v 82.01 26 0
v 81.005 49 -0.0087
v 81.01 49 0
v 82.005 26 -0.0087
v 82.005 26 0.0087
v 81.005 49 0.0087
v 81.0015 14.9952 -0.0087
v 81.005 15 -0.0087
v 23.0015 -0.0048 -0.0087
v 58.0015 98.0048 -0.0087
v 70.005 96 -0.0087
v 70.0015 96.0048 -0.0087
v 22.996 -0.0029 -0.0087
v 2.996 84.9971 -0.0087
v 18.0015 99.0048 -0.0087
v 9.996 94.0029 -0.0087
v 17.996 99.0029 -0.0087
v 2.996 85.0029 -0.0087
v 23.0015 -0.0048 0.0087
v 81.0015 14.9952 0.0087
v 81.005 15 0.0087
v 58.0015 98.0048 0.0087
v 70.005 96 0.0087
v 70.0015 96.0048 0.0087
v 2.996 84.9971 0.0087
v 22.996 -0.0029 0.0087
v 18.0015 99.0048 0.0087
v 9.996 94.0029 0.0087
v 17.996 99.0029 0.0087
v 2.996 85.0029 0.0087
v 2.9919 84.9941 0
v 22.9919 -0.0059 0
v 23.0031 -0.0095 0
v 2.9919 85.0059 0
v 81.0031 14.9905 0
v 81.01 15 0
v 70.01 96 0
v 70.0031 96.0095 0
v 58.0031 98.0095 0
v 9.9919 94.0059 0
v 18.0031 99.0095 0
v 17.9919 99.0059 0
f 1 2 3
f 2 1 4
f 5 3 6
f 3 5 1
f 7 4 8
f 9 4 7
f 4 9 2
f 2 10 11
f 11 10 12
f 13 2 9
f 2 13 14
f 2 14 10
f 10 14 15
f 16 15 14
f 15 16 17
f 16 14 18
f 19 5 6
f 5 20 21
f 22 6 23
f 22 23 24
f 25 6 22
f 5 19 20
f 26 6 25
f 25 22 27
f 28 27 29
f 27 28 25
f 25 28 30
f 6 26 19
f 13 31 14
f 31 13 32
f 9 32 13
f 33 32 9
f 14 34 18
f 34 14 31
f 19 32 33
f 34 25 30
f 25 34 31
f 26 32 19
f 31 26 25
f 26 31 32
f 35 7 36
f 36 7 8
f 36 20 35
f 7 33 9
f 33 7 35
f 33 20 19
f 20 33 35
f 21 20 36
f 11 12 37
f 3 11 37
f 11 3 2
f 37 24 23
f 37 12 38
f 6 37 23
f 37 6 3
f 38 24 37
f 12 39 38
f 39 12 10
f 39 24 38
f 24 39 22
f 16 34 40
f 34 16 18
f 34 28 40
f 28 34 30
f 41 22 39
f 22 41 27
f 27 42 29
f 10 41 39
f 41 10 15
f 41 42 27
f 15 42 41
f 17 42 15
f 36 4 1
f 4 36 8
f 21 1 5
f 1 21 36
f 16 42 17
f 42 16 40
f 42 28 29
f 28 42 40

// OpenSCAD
color([0.3519350680925015,0.6477014615427978,0.14125726454845833]) hull(){
    translate([81,49]) sphere(0.01);
    translate([77,50]) sphere(0.01);
    translate([82,26]) sphere(0.01);
}
color([0.23013900541024712,0.8285218163248013,0.9603761550286747]) hull(){
    translate([23,0]) sphere(0.01);
    translate([18,24]) sphere(0.01);
    translate([3,85]) sphere(0.01);
}
color([0.6050710034948523,0.017553655236826726,0.43262871278032167]) hull(){
    translate([81,15]) sphere(0.01);
    translate([64,14]) sphere(0.01);
    translate([23,0]) sphere(0.01);
}
color([0.2571490251669072,0.4480229944680496,0.14517873337393172]) hull(){
    translate([64,14]) sphere(0.01);
    translate([42,29]) sphere(0.01);
    translate([23,0]) sphere(0.01);
}
color([0.8405131005933094,0.9776834869331054,0.10300019528175153]) hull(){
    translate([42,29]) sphere(0.01);
    translate([44,47]) sphere(0.01);
    translate([35,48]) sphere(0.01);
}
color([0.998153073210626,0.8535026464000083,0.6855970549077809]) hull(){
    translate([18,24]) sphere(0.01);
    translate([18,58]) sphere(0.01);
    translate([3,85]) sphere(0.01);
}
color([0.7995005100691247,0.34047238184459006,0.1286635278612125]) hull(){
    translate([80,52]) sphere(0.01);
    translate([81,49]) sphere(0.01);
    translate([70,96]) sphere(0.01);
}
color([0.6020598448119898,0.9167847797194366,0.02081986636819022]) hull(){
    translate([81,49]) sphere(0.01);
    translate([80,52]) sphere(0.01);
    translate([77,50]) sphere(0.01);
}
color([0.9135118305629362,0.3823609034395232,0.42581309278619206]) hull(){
    translate([26,22]) sphere(0.01);
    translate([42,29]) sphere(0.01);
    translate([35,48]) sphere(0.01);
}
color([0.08967296065919184,0.0016857337534631478,0.31287848776698257]) hull(){
    translate([42,29]) sphere(0.01);
    translate([26,22]) sphere(0.01);
    translate([23,0]) sphere(0.01);
}
color([0.09731792302828757,0.364404074066101,0.8754307508322564]) hull(){
    translate([68,15]) sphere(0.01);
    translate([64,14]) sphere(0.01);
    translate([81,15]) sphere(0.01);
}
color([0.6967090939923642,0.5776053806129825,0.18685318159950626]) hull(){
    translate([59,71]) sphere(0.01);
    translate([80,52]) sphere(0.01);
    translate([70,96]) sphere(0.01);
}
color([0.9585806736472646,0.593334846568766,0.09927504601217696]) hull(){
    translate([80,52]) sphere(0.01);
    translate([59,71]) sphere(0.01);
    translate([77,50]) sphere(0.01);
}
color([0.19313665173925,0.6863688301261038,0.2093263356404984]) hull(){
    translate([58,98]) sphere(0.01);
    translate([59,71]) sphere(0.01);
    translate([70,96]) sphere(0.01);
}
color([0.2694340379225941,0.24598969558588324,0.16092298384524362]) hull(){
    translate([59,71]) sphere(0.01);
    translate([58,98]) sphere(0.01);
    translate([50,93]) sphere(0.01);
}
color([0.5102606956149307,0.431705445139412,0.38909399282504675]) hull(){
    translate([6,84]) sphere(0.01);
    translate([10,94]) sphere(0.01);
    translate([3,85]) sphere(0.01);
}
color([0.3194819673674283,0.6655357355223767,0.22692357675811492]) hull(){
    translate([18,58]) sphere(0.01);
    translate([6,84]) sphere(0.01);
    translate([3,85]) sphere(0.01);
}
color([0.9464906820257937,0.35776616524050997,0.9421064453260054]) hull(){
    translate([20,83]) sphere(0.01);
    translate([59,71]) sphere(0.01);
    translate([50,93]) sphere(0.01);
}
color([0.3792404853118415,0.27508202782836655,0.9368074710650367]) hull(){
    translate([6,84]) sphere(0.01);
    translate([20,83]) sphere(0.01);
    translate([10,94]) sphere(0.01);
}
color([0.7670397757471089,0.17483880300164423,0.7474114244696689]) hull(){
    translate([24,21]) sphere(0.01);
    translate([18,24]) sphere(0.01);
    translate([23,0]) sphere(0.01);
}
color([0.6015236368594579,0.5872808850844162,0.28390336255679416]) hull(){
    translate([26,22]) sphere(0.01);
    translate([24,21]) sphere(0.01);
    translate([23,0]) sphere(0.01);
}
color([0.5839405385485582,0.4048698908705002,0.6877557316706271]) hull(){
    translate([24,21]) sphere(0.01);
    translate([26,22]) sphere(0.01);
    translate([18,24]) sphere(0.01);
}
color([0.29310936231965135,0.08456113000314536,0.6409271470126323]) hull(){
    translate([77,50]) sphere(0.01);
    translate([58,33]) sphere(0.01);
    translate([82,26]) sphere(0.01);
}
color([0.38512246522478266,0.6162859510128613,0.407224705538046]) hull(){
    translate([44,47]) sphere(0.01);
    translate([58,33]) sphere(0.01);
    translate([77,50]) sphere(0.01);
}
color([0.6107800780239486,0.9541913078580654,0.09369719926319908]) hull(){
    translate([58,33]) sphere(0.01);
    translate([44,47]) sphere(0.01);
    translate([42,29]) sphere(0.01);
}
color([0.4396226851829427,0.9817497074141792,0.30111933510979894]) hull(){
    translate([64,14]) sphere(0.01);
    translate([58,33]) sphere(0.01);
    translate([42,29]) sphere(0.01);
}
color([0.08571041628526821,0.691130580335744,0.16573157374072334]) hull(){
    translate([44,55]) sphere(0.01);
    translate([44,47]) sphere(0.01);
    translate([77,50]) sphere(0.01);
}
color([0.4668304924867862,0.30100213617539295,0.3511677492745029]) hull(){
    translate([59,71]) sphere(0.01);
    translate([44,55]) sphere(0.01);
    translate([77,50]) sphere(0.01);
}
color([0.05564944269037686,0.7696481469448815,0.686275624239137]) hull(){
    translate([44,47]) sphere(0.01);
    translate([44,55]) sphere(0.01);
    translate([35,48]) sphere(0.01);
}
color([0.15447252119296884,0.35335085758162643,0.18799175914388588]) hull(){
    translate([39,98]) sphere(0.01);
    translate([20,83]) sphere(0.01);
    translate([50,93]) sphere(0.01);
}
color([0.41322879780265653,0.82270842281296,0.9057146612667819]) hull(){
    translate([39,98]) sphere(0.01);
    translate([58,98]) sphere(0.01);
    translate([18,99]) sphere(0.01);
}
color([0.9688547633127277,0.5528378273263655,0.12760284187612392]) hull(){
    translate([58,98]) sphere(0.01);
    translate([39,98]) sphere(0.01);
    translate([50,93]) sphere(0.01);
}
color([0.1710979555253146,0.7131998843266452,0.6397779425125977]) hull(){
    translate([16,79]) sphere(0.01);
    translate([6,84]) sphere(0.01);
    translate([18,58]) sphere(0.01);
}
color([0.57496968906483,0.8489371230716904,0.07944838941339594]) hull(){
    translate([16,79]) sphere(0.01);
    translate([20,83]) sphere(0.01);
    translate([6,84]) sphere(0.01);
}
color([0.040333123224873146,0.9305910632054132,0.3080440975445232]) hull(){
    translate([68,15]) sphere(0.01);
    translate([72,20]) sphere(0.01);
    translate([64,14]) sphere(0.01);
}
color([0.6084655882345898,0.4923441190446234,0.7069385087242315]) hull(){
    translate([72,20]) sphere(0.01);
    translate([58,33]) sphere(0.01);
    translate([64,14]) sphere(0.01);
}
color([0.6803385961846494,0.18024793645131376,0.10787678186317007]) hull(){
    translate([58,33]) sphere(0.01);
    translate([72,20]) sphere(0.01);
    translate([82,26]) sphere(0.01);
}
color([0.1335624130282893,0.47731112778056706,0.8393950916733898]) hull(){
    translate([72,20]) sphere(0.01);
    translate([81,15]) sphere(0.01);
    translate([82,26]) sphere(0.01);
}
color([0.6780893207968227,0.08337096158279222,0.27725115680544954]) hull(){
    translate([72,20]) sphere(0.01);
    translate([68,15]) sphere(0.01);
    translate([81,15]) sphere(0.01);
}
color([0.9965791662073833,0.03375154870506614,0.10494976972159242]) hull(){
    translate([20,83]) sphere(0.01);
    translate([30,57]) sphere(0.01);
    translate([59,71]) sphere(0.01);
}
color([0.516844917539197,0.1360610465034362,0.543805910213663]) hull(){
    translate([30,57]) sphere(0.01);
    translate([44,55]) sphere(0.01);
    translate([59,71]) sphere(0.01);
}
color([0.04901628196141694,0.4867102513994055,0.8813892002857401]) hull(){
    translate([30,57]) sphere(0.01);
    translate([16,79]) sphere(0.01);
    translate([18,58]) sphere(0.01);
}
color([0.3053751014353143,0.40772022041766365,0.31297204198076634]) hull(){
    translate([16,79]) sphere(0.01);
    translate([30,57]) sphere(0.01);
    translate([20,83]) sphere(0.01);
}
color([0.49907796034366436,0.6160709555012981,0.9916538905911245]) hull(){
    translate([44,55]) sphere(0.01);
    translate([30,57]) sphere(0.01);
    translate([35,48]) sphere(0.01);
}
color([0.3123575451593331,0.46364206475662195,0.8862899719975306]) hull(){
    translate([22,90]) sphere(0.01);
    translate([39,98]) sphere(0.01);
    translate([18,99]) sphere(0.01);
}
color([0.5738800220993816,0.8494037217359881,0.24323676398212035]) hull(){
    translate([39,98]) sphere(0.01);
    translate([22,90]) sphere(0.01);
    translate([20,83]) sphere(0.01);
}
color([0.8402878098664139,0.9530478541805099,0.16594803365564914]) hull(){
    translate([10,94]) sphere(0.01);
    translate([22,90]) sphere(0.01);
    translate([18,99]) sphere(0.01);
}
color([0.0023370868964924796,0.7387895340607371,0.5374530602666081]) hull(){
    translate([20,83]) sphere(0.01);
    translate([22,90]) sphere(0.01);
    translate([10,94]) sphere(0.01);
}
color([0.25604025835089217,0.4320068924153808,0.5112453323210508]) hull(){
    translate([30,57]) sphere(0.01);
    translate([26,51]) sphere(0.01);
    translate([35,48]) sphere(0.01);
}
color([0.7462272619347637,0.5039790716190428,0.8850839351693509]) hull(){
    translate([26,51]) sphere(0.01);
    translate([30,57]) sphere(0.01);
    translate([18,58]) sphere(0.01);
}
color([0.6652757233710683,0.22263754843686523,0.08942086350367451]) hull(){
    translate([26,51]) sphere(0.01);
    translate([18,58]) sphere(0.01);
    translate([18,24]) sphere(0.01);
}
color([0.6195232841458308,0.9036720387350747,0.7222923954673625]) hull(){
    translate([26,51]) sphere(0.01);
    translate([26,22]) sphere(0.01);
    translate([35,48]) sphere(0.01);
}
color([0.6665075097113882,0.5421139713900744,0.6943978877819516]) hull(){
    translate([26,22]) sphere(0.01);
    translate([26,51]) sphere(0.01);
    translate([18,24]) sphere(0.01);
}
